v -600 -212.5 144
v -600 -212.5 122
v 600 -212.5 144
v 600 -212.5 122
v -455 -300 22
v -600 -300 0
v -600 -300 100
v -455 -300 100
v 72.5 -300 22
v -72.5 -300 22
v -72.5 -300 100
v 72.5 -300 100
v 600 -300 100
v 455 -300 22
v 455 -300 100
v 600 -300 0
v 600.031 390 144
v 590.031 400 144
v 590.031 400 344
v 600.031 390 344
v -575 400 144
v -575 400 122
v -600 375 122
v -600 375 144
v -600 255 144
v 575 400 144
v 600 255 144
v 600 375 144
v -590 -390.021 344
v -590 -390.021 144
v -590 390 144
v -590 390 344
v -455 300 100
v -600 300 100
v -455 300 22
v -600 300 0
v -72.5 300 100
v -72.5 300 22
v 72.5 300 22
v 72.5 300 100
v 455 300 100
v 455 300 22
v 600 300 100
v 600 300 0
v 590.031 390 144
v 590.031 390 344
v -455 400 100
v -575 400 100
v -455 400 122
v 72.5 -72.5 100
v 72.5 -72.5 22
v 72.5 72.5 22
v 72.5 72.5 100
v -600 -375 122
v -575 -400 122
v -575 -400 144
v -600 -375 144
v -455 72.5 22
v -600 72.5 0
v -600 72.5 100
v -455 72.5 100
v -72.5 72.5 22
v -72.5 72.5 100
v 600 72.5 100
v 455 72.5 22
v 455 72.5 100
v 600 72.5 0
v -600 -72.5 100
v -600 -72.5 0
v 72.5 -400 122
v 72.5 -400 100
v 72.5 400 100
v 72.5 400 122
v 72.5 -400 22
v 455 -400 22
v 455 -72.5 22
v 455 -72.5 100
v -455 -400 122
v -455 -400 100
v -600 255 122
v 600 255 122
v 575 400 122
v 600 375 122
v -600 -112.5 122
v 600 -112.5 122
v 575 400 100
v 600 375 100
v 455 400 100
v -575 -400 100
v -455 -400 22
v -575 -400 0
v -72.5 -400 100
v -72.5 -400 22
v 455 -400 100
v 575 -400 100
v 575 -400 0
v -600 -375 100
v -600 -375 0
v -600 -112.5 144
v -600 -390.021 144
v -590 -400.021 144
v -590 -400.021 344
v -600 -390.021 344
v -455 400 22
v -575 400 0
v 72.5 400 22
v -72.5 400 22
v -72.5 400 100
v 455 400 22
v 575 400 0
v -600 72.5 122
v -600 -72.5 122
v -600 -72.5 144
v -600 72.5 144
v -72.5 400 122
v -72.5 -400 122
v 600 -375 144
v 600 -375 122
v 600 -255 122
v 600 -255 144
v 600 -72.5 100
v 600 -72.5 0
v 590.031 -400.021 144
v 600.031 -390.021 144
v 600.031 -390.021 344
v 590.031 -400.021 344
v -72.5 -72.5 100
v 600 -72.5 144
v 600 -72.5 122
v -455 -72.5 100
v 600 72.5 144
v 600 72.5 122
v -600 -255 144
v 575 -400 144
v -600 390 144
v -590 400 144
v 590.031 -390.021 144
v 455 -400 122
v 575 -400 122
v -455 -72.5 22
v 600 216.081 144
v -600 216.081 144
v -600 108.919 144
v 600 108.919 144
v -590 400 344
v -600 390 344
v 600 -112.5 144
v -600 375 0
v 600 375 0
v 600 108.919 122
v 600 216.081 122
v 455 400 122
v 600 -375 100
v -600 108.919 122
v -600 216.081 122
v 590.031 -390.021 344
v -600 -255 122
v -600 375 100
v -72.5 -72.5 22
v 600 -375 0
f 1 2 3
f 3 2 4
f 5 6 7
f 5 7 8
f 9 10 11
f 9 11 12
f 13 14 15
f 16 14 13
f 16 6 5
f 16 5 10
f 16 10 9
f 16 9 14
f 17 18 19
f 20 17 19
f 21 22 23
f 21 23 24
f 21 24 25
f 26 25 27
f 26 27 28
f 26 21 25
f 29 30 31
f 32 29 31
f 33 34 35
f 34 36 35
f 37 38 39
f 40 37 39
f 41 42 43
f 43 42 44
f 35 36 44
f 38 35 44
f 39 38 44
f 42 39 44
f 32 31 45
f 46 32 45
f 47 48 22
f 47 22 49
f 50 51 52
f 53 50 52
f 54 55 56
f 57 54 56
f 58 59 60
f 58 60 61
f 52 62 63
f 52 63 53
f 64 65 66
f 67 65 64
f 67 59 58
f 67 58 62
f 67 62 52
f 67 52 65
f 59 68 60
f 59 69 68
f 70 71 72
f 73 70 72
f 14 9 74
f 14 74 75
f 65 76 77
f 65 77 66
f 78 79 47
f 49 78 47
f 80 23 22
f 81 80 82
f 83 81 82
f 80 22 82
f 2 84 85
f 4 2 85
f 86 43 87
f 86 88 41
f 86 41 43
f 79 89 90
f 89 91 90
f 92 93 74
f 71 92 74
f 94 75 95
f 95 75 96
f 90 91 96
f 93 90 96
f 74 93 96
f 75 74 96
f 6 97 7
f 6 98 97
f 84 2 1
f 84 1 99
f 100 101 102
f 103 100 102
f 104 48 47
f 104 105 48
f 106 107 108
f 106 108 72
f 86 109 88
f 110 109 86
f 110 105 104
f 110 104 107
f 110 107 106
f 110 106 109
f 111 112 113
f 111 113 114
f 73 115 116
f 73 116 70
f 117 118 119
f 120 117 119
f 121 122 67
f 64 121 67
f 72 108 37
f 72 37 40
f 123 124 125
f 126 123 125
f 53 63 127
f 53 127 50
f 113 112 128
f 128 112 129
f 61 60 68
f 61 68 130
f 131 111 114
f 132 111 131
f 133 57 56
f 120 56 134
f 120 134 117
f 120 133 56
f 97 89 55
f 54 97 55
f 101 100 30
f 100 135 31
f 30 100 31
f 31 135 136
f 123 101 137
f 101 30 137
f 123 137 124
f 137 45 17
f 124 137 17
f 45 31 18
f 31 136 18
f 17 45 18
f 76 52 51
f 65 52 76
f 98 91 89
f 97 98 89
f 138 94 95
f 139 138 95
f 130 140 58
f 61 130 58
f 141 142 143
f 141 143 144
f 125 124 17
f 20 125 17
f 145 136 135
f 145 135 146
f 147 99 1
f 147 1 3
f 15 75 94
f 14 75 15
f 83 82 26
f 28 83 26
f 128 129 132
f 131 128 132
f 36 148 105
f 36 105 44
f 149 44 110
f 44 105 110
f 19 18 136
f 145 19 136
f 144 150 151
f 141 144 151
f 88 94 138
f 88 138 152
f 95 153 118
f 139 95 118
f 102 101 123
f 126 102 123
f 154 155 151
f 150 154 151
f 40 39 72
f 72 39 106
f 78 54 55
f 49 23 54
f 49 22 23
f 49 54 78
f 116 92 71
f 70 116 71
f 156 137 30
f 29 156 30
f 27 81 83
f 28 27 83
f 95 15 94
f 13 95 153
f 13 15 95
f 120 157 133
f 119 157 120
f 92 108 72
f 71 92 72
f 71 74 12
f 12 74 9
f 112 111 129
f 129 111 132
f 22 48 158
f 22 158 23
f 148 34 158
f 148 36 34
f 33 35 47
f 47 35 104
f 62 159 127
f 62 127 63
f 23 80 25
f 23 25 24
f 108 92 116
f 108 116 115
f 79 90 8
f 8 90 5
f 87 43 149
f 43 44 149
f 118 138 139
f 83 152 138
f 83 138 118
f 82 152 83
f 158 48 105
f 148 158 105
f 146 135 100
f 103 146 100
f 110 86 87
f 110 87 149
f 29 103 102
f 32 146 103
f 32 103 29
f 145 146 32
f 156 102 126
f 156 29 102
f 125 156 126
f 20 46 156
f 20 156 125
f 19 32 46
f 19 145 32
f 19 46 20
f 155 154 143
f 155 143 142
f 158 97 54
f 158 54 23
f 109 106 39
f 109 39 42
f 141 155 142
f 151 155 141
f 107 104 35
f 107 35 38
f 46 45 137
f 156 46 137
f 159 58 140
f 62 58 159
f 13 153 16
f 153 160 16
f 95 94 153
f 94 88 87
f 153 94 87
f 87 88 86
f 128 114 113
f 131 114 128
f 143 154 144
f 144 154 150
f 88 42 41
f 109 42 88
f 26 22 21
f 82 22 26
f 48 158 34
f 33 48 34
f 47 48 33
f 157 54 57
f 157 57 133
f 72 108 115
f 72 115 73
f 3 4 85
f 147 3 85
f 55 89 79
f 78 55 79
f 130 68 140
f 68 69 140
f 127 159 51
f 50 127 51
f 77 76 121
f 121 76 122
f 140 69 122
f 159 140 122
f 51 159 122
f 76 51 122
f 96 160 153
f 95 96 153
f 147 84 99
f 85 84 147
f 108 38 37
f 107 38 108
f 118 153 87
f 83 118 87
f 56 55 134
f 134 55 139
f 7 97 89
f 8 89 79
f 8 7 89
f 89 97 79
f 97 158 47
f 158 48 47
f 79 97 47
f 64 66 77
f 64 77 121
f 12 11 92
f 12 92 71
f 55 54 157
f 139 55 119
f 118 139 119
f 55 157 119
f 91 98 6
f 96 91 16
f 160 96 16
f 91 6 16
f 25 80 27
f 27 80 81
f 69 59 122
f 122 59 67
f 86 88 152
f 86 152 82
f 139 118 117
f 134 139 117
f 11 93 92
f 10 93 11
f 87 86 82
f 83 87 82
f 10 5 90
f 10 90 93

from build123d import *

# Parameters (mm, degrees)
F0_W       = 1200
F0_H       = 100
F1_DEPTH   = 22
F0_H_2     = 72.5
F2_W       = 145
F2_H       = 100
F2_W_2     = 72.5
F3_DEPTH   = 78
F4_W       = 145
F4_H       = 145
F5_DEPTH   = 78
F6_W       = 145
F6_H       = 100
F7_DEPTH   = 78
F8_W       = 145
F8_H       = 800
F9_DEPTH   = 22
F10_W      = 145
F10_H      = 800
F11_DEPTH  = 22
F12_W      = 145
F12_H      = 800
F13_DEPTH  = 22
F14_W      = 1200
F14_H      = 145
F15_DEPTH  = 22
F16_W      = 1200
F16_H      = 145
F17_DEPTH  = 22
F18_W      = 1200
F18_H      = 145
F19_DEPTH  = 22
F20_W      = 1200
F20_H      = 107.1627608397
F21_DEPTH  = 22
F22_W      = 1200
F22_H      = 100
F23_DEPTH  = 22
F24_SIZE   = 25
F24_2_SIZE = 25
F24_3_SIZE = 25
F24_4_SIZE = 25
F24_5_SIZE = 25
F24_6_SIZE = 25
F26_DEPTH  = 200
F27_SIZE   = 10


with BuildPart() as f1:
    # F0 (on Top) → F1 (new body)
    with BuildSketch(Plane.XY):
        with Locations((0, 350)):
            Rectangle(F0_W, F0_H)
    extrude(amount=F1_DEPTH)

    # F2 (on face) → F3 (join)
    with BuildSketch(Plane.XY.offset(22)):
        with Locations((-527.5, 350)):
            Rectangle(F2_W, F2_H)
        with Locations((-36.25, 350)):
            Rectangle(F2_W_2, F2_H)
        with Locations((36.25, 350)):
            Rectangle(F2_W_2, F2_H)
        with Locations((527.5, 350)):
            Rectangle(F2_W, F2_H)
    extrude(amount=F3_DEPTH)

    # F24#6
    f24_6_edges = [f1.edges().sort_by_distance(p)[0] for p in [
        (600, 400, 50),
        (-600, 400, 50),
    ]]
    chamfer(f24_6_edges, length=F24_6_SIZE)


with BuildPart() as f1b:
    # F0 (on Top) → F1, piece 2 (new body)
    with BuildSketch(Plane.XY):
        with Locations((0, 36.25)):
            Rectangle(F0_W, F0_H_2)
        with Locations((0, -36.25)):
            Rectangle(F0_W, F0_H_2)
    extrude(amount=F1_DEPTH)

    # F4 (on face) → F5 (join)
    with BuildSketch(Plane.XY.offset(22)):
        with Locations((-527.5, 0)):
            Rectangle(F4_W, F4_H)
        Rectangle(F4_W, F4_H)
        with Locations((527.5, 0)):
            Rectangle(F4_W, F4_H)
    extrude(amount=F5_DEPTH)


with BuildPart() as f1c:
    # F0 (on Top) → F1, piece 3 (new body)
    with BuildSketch(Plane.XY):
        with Locations((0, -350)):
            Rectangle(F0_W, F0_H)
    extrude(amount=F1_DEPTH)

    # F6 (on face) → F7 (join)
    with BuildSketch(Plane.XY.offset(22)):
        with Locations((-527.5, -350)):
            Rectangle(F6_W, F6_H)
        with Locations((0, -350)):
            Rectangle(F6_W, F6_H)
        with Locations((527.5, -350)):
            Rectangle(F6_W, F6_H)
    extrude(amount=F7_DEPTH)

    # F24#3
    f24_3_edges = [f1c.edges().sort_by_distance(p)[0] for p in [
        (-600, -400, 50),
        (600, -400, 50),
    ]]
    chamfer(f24_3_edges, length=F24_3_SIZE)


with BuildPart() as f9:
    # F8 (on face) → F9 (new body)
    with BuildSketch(Plane.XY.offset(100)):
        with Locations((-527.5, 0)):
            Rectangle(F8_W, F8_H)
    extrude(amount=F9_DEPTH)

    # F24#2
    f24_2_edges = [f9.edges().sort_by_distance(p)[0] for p in [
        (-600, -400, 111),
        (-600, 400, 111),
    ]]
    chamfer(f24_2_edges, length=F24_2_SIZE)


with BuildPart() as f11:
    # F10 (on face) → F11 (new body)
    with BuildSketch(Plane.XY.offset(100)):
        Rectangle(F10_W, F10_H)
    extrude(amount=F11_DEPTH)


with BuildPart() as f13:
    # F12 (on face) → F13 (new body)
    with BuildSketch(Plane.XY.offset(100)):
        with Locations((527.5, 0)):
            Rectangle(F12_W, F12_H)
    extrude(amount=F13_DEPTH)

    # F24#4
    f24_4_edges = [f13.edges().sort_by_distance(p)[0] for p in [
        (600, -400, 111),
        (600, 400, 111),
    ]]
    chamfer(f24_4_edges, length=F24_4_SIZE)


with BuildPart() as f15:
    # F14 (on face) → F15 (new body)
    with BuildSketch(Plane.XY.offset(122)):
        with Locations((0, 327.5)):
            Rectangle(F14_W, F14_H)
    extrude(amount=F15_DEPTH)

    # F24#5
    f24_5_edges = [f15.edges().sort_by_distance(p)[0] for p in [
        (600, 400, 133),
        (-600, 400, 133),
    ]]
    chamfer(f24_5_edges, length=F24_5_SIZE)


with BuildPart() as f17:
    # F16 (on face) → F17 (new body)
    with BuildSketch(Plane.XY.offset(122)):
        Rectangle(F16_W, F16_H)
    extrude(amount=F17_DEPTH)


with BuildPart() as f19:
    # F18 (on face) → F19 (new body)
    with BuildSketch(Plane.XY.offset(122)):
        with Locations((0, -327.5)):
            Rectangle(F18_W, F18_H)
    extrude(amount=F19_DEPTH)

    # F24
    f24_edges = [f19.edges().sort_by_distance(p)[0] for p in [
        (-600, -400, 133),
        (600, -400, 133),
    ]]
    chamfer(f24_edges, length=F24_SIZE)


with BuildPart() as f21:
    # F20 (on face) → F21 (new body)
    with BuildSketch(Plane.XY.offset(122)):
        with Locations((0, 162.5)):
            Rectangle(F20_W, F20_H)
    extrude(amount=F21_DEPTH)


with BuildPart() as f23:
    # F22 (on face) → F23 (new body)
    with BuildSketch(Plane.XY.offset(122)):
        with Locations((0, -162.5)):
            Rectangle(F22_W, F22_H)
    extrude(amount=F23_DEPTH)


with BuildPart() as f26:
    # F25 (on face) → F26 (new body)
    with BuildSketch(Plane.XY.offset(144)):
        Polygon((575, 400), (-575, 400), (-585, 390), (585, 390), align=None)
        Polygon((-575, 400), (-600, 400), (-600, 375), (-590, 385), (-590, 390), (-585, 390), align=None)
        Polygon((-590, 385), (-600, 375), (-600, 255), (-590, 255), align=None)
        Polygon((600.0311231613, 400), (575, 400), (585, 390), (590.0311231613, 390), (590.0311231613, 384.9688768387), (600, 375), (600, 255), (590.0311231613, 255), (590.0311231613, -390.0209569931), (-590, -390.0209569931), (-590, 255), (-600, 255), (-600, -400.0209569931), (600.0311231613, -400.0209569931), align=None)
        Polygon((600, 375), (590.0311231613, 384.9688768387), (590.0311231613, 255), (600, 255), align=None)
    extrude(amount=F26_DEPTH)

    # F27
    f27_edges = [f26.edges().sort_by_distance(p)[0] for p in [
        (600.031123, -400.020957, 244),
        (600.031123, 400, 244),
        (-600, -400.020957, 244),
        (-600, 400, 244),
    ]]
    chamfer(f27_edges, length=F27_SIZE)


solid = Compound([f1.part, f1b.part, f1c.part, f9.part, f11.part, f13.part, f15.part, f17.part, f19.part, f21.part, f23.part, f26.part])
